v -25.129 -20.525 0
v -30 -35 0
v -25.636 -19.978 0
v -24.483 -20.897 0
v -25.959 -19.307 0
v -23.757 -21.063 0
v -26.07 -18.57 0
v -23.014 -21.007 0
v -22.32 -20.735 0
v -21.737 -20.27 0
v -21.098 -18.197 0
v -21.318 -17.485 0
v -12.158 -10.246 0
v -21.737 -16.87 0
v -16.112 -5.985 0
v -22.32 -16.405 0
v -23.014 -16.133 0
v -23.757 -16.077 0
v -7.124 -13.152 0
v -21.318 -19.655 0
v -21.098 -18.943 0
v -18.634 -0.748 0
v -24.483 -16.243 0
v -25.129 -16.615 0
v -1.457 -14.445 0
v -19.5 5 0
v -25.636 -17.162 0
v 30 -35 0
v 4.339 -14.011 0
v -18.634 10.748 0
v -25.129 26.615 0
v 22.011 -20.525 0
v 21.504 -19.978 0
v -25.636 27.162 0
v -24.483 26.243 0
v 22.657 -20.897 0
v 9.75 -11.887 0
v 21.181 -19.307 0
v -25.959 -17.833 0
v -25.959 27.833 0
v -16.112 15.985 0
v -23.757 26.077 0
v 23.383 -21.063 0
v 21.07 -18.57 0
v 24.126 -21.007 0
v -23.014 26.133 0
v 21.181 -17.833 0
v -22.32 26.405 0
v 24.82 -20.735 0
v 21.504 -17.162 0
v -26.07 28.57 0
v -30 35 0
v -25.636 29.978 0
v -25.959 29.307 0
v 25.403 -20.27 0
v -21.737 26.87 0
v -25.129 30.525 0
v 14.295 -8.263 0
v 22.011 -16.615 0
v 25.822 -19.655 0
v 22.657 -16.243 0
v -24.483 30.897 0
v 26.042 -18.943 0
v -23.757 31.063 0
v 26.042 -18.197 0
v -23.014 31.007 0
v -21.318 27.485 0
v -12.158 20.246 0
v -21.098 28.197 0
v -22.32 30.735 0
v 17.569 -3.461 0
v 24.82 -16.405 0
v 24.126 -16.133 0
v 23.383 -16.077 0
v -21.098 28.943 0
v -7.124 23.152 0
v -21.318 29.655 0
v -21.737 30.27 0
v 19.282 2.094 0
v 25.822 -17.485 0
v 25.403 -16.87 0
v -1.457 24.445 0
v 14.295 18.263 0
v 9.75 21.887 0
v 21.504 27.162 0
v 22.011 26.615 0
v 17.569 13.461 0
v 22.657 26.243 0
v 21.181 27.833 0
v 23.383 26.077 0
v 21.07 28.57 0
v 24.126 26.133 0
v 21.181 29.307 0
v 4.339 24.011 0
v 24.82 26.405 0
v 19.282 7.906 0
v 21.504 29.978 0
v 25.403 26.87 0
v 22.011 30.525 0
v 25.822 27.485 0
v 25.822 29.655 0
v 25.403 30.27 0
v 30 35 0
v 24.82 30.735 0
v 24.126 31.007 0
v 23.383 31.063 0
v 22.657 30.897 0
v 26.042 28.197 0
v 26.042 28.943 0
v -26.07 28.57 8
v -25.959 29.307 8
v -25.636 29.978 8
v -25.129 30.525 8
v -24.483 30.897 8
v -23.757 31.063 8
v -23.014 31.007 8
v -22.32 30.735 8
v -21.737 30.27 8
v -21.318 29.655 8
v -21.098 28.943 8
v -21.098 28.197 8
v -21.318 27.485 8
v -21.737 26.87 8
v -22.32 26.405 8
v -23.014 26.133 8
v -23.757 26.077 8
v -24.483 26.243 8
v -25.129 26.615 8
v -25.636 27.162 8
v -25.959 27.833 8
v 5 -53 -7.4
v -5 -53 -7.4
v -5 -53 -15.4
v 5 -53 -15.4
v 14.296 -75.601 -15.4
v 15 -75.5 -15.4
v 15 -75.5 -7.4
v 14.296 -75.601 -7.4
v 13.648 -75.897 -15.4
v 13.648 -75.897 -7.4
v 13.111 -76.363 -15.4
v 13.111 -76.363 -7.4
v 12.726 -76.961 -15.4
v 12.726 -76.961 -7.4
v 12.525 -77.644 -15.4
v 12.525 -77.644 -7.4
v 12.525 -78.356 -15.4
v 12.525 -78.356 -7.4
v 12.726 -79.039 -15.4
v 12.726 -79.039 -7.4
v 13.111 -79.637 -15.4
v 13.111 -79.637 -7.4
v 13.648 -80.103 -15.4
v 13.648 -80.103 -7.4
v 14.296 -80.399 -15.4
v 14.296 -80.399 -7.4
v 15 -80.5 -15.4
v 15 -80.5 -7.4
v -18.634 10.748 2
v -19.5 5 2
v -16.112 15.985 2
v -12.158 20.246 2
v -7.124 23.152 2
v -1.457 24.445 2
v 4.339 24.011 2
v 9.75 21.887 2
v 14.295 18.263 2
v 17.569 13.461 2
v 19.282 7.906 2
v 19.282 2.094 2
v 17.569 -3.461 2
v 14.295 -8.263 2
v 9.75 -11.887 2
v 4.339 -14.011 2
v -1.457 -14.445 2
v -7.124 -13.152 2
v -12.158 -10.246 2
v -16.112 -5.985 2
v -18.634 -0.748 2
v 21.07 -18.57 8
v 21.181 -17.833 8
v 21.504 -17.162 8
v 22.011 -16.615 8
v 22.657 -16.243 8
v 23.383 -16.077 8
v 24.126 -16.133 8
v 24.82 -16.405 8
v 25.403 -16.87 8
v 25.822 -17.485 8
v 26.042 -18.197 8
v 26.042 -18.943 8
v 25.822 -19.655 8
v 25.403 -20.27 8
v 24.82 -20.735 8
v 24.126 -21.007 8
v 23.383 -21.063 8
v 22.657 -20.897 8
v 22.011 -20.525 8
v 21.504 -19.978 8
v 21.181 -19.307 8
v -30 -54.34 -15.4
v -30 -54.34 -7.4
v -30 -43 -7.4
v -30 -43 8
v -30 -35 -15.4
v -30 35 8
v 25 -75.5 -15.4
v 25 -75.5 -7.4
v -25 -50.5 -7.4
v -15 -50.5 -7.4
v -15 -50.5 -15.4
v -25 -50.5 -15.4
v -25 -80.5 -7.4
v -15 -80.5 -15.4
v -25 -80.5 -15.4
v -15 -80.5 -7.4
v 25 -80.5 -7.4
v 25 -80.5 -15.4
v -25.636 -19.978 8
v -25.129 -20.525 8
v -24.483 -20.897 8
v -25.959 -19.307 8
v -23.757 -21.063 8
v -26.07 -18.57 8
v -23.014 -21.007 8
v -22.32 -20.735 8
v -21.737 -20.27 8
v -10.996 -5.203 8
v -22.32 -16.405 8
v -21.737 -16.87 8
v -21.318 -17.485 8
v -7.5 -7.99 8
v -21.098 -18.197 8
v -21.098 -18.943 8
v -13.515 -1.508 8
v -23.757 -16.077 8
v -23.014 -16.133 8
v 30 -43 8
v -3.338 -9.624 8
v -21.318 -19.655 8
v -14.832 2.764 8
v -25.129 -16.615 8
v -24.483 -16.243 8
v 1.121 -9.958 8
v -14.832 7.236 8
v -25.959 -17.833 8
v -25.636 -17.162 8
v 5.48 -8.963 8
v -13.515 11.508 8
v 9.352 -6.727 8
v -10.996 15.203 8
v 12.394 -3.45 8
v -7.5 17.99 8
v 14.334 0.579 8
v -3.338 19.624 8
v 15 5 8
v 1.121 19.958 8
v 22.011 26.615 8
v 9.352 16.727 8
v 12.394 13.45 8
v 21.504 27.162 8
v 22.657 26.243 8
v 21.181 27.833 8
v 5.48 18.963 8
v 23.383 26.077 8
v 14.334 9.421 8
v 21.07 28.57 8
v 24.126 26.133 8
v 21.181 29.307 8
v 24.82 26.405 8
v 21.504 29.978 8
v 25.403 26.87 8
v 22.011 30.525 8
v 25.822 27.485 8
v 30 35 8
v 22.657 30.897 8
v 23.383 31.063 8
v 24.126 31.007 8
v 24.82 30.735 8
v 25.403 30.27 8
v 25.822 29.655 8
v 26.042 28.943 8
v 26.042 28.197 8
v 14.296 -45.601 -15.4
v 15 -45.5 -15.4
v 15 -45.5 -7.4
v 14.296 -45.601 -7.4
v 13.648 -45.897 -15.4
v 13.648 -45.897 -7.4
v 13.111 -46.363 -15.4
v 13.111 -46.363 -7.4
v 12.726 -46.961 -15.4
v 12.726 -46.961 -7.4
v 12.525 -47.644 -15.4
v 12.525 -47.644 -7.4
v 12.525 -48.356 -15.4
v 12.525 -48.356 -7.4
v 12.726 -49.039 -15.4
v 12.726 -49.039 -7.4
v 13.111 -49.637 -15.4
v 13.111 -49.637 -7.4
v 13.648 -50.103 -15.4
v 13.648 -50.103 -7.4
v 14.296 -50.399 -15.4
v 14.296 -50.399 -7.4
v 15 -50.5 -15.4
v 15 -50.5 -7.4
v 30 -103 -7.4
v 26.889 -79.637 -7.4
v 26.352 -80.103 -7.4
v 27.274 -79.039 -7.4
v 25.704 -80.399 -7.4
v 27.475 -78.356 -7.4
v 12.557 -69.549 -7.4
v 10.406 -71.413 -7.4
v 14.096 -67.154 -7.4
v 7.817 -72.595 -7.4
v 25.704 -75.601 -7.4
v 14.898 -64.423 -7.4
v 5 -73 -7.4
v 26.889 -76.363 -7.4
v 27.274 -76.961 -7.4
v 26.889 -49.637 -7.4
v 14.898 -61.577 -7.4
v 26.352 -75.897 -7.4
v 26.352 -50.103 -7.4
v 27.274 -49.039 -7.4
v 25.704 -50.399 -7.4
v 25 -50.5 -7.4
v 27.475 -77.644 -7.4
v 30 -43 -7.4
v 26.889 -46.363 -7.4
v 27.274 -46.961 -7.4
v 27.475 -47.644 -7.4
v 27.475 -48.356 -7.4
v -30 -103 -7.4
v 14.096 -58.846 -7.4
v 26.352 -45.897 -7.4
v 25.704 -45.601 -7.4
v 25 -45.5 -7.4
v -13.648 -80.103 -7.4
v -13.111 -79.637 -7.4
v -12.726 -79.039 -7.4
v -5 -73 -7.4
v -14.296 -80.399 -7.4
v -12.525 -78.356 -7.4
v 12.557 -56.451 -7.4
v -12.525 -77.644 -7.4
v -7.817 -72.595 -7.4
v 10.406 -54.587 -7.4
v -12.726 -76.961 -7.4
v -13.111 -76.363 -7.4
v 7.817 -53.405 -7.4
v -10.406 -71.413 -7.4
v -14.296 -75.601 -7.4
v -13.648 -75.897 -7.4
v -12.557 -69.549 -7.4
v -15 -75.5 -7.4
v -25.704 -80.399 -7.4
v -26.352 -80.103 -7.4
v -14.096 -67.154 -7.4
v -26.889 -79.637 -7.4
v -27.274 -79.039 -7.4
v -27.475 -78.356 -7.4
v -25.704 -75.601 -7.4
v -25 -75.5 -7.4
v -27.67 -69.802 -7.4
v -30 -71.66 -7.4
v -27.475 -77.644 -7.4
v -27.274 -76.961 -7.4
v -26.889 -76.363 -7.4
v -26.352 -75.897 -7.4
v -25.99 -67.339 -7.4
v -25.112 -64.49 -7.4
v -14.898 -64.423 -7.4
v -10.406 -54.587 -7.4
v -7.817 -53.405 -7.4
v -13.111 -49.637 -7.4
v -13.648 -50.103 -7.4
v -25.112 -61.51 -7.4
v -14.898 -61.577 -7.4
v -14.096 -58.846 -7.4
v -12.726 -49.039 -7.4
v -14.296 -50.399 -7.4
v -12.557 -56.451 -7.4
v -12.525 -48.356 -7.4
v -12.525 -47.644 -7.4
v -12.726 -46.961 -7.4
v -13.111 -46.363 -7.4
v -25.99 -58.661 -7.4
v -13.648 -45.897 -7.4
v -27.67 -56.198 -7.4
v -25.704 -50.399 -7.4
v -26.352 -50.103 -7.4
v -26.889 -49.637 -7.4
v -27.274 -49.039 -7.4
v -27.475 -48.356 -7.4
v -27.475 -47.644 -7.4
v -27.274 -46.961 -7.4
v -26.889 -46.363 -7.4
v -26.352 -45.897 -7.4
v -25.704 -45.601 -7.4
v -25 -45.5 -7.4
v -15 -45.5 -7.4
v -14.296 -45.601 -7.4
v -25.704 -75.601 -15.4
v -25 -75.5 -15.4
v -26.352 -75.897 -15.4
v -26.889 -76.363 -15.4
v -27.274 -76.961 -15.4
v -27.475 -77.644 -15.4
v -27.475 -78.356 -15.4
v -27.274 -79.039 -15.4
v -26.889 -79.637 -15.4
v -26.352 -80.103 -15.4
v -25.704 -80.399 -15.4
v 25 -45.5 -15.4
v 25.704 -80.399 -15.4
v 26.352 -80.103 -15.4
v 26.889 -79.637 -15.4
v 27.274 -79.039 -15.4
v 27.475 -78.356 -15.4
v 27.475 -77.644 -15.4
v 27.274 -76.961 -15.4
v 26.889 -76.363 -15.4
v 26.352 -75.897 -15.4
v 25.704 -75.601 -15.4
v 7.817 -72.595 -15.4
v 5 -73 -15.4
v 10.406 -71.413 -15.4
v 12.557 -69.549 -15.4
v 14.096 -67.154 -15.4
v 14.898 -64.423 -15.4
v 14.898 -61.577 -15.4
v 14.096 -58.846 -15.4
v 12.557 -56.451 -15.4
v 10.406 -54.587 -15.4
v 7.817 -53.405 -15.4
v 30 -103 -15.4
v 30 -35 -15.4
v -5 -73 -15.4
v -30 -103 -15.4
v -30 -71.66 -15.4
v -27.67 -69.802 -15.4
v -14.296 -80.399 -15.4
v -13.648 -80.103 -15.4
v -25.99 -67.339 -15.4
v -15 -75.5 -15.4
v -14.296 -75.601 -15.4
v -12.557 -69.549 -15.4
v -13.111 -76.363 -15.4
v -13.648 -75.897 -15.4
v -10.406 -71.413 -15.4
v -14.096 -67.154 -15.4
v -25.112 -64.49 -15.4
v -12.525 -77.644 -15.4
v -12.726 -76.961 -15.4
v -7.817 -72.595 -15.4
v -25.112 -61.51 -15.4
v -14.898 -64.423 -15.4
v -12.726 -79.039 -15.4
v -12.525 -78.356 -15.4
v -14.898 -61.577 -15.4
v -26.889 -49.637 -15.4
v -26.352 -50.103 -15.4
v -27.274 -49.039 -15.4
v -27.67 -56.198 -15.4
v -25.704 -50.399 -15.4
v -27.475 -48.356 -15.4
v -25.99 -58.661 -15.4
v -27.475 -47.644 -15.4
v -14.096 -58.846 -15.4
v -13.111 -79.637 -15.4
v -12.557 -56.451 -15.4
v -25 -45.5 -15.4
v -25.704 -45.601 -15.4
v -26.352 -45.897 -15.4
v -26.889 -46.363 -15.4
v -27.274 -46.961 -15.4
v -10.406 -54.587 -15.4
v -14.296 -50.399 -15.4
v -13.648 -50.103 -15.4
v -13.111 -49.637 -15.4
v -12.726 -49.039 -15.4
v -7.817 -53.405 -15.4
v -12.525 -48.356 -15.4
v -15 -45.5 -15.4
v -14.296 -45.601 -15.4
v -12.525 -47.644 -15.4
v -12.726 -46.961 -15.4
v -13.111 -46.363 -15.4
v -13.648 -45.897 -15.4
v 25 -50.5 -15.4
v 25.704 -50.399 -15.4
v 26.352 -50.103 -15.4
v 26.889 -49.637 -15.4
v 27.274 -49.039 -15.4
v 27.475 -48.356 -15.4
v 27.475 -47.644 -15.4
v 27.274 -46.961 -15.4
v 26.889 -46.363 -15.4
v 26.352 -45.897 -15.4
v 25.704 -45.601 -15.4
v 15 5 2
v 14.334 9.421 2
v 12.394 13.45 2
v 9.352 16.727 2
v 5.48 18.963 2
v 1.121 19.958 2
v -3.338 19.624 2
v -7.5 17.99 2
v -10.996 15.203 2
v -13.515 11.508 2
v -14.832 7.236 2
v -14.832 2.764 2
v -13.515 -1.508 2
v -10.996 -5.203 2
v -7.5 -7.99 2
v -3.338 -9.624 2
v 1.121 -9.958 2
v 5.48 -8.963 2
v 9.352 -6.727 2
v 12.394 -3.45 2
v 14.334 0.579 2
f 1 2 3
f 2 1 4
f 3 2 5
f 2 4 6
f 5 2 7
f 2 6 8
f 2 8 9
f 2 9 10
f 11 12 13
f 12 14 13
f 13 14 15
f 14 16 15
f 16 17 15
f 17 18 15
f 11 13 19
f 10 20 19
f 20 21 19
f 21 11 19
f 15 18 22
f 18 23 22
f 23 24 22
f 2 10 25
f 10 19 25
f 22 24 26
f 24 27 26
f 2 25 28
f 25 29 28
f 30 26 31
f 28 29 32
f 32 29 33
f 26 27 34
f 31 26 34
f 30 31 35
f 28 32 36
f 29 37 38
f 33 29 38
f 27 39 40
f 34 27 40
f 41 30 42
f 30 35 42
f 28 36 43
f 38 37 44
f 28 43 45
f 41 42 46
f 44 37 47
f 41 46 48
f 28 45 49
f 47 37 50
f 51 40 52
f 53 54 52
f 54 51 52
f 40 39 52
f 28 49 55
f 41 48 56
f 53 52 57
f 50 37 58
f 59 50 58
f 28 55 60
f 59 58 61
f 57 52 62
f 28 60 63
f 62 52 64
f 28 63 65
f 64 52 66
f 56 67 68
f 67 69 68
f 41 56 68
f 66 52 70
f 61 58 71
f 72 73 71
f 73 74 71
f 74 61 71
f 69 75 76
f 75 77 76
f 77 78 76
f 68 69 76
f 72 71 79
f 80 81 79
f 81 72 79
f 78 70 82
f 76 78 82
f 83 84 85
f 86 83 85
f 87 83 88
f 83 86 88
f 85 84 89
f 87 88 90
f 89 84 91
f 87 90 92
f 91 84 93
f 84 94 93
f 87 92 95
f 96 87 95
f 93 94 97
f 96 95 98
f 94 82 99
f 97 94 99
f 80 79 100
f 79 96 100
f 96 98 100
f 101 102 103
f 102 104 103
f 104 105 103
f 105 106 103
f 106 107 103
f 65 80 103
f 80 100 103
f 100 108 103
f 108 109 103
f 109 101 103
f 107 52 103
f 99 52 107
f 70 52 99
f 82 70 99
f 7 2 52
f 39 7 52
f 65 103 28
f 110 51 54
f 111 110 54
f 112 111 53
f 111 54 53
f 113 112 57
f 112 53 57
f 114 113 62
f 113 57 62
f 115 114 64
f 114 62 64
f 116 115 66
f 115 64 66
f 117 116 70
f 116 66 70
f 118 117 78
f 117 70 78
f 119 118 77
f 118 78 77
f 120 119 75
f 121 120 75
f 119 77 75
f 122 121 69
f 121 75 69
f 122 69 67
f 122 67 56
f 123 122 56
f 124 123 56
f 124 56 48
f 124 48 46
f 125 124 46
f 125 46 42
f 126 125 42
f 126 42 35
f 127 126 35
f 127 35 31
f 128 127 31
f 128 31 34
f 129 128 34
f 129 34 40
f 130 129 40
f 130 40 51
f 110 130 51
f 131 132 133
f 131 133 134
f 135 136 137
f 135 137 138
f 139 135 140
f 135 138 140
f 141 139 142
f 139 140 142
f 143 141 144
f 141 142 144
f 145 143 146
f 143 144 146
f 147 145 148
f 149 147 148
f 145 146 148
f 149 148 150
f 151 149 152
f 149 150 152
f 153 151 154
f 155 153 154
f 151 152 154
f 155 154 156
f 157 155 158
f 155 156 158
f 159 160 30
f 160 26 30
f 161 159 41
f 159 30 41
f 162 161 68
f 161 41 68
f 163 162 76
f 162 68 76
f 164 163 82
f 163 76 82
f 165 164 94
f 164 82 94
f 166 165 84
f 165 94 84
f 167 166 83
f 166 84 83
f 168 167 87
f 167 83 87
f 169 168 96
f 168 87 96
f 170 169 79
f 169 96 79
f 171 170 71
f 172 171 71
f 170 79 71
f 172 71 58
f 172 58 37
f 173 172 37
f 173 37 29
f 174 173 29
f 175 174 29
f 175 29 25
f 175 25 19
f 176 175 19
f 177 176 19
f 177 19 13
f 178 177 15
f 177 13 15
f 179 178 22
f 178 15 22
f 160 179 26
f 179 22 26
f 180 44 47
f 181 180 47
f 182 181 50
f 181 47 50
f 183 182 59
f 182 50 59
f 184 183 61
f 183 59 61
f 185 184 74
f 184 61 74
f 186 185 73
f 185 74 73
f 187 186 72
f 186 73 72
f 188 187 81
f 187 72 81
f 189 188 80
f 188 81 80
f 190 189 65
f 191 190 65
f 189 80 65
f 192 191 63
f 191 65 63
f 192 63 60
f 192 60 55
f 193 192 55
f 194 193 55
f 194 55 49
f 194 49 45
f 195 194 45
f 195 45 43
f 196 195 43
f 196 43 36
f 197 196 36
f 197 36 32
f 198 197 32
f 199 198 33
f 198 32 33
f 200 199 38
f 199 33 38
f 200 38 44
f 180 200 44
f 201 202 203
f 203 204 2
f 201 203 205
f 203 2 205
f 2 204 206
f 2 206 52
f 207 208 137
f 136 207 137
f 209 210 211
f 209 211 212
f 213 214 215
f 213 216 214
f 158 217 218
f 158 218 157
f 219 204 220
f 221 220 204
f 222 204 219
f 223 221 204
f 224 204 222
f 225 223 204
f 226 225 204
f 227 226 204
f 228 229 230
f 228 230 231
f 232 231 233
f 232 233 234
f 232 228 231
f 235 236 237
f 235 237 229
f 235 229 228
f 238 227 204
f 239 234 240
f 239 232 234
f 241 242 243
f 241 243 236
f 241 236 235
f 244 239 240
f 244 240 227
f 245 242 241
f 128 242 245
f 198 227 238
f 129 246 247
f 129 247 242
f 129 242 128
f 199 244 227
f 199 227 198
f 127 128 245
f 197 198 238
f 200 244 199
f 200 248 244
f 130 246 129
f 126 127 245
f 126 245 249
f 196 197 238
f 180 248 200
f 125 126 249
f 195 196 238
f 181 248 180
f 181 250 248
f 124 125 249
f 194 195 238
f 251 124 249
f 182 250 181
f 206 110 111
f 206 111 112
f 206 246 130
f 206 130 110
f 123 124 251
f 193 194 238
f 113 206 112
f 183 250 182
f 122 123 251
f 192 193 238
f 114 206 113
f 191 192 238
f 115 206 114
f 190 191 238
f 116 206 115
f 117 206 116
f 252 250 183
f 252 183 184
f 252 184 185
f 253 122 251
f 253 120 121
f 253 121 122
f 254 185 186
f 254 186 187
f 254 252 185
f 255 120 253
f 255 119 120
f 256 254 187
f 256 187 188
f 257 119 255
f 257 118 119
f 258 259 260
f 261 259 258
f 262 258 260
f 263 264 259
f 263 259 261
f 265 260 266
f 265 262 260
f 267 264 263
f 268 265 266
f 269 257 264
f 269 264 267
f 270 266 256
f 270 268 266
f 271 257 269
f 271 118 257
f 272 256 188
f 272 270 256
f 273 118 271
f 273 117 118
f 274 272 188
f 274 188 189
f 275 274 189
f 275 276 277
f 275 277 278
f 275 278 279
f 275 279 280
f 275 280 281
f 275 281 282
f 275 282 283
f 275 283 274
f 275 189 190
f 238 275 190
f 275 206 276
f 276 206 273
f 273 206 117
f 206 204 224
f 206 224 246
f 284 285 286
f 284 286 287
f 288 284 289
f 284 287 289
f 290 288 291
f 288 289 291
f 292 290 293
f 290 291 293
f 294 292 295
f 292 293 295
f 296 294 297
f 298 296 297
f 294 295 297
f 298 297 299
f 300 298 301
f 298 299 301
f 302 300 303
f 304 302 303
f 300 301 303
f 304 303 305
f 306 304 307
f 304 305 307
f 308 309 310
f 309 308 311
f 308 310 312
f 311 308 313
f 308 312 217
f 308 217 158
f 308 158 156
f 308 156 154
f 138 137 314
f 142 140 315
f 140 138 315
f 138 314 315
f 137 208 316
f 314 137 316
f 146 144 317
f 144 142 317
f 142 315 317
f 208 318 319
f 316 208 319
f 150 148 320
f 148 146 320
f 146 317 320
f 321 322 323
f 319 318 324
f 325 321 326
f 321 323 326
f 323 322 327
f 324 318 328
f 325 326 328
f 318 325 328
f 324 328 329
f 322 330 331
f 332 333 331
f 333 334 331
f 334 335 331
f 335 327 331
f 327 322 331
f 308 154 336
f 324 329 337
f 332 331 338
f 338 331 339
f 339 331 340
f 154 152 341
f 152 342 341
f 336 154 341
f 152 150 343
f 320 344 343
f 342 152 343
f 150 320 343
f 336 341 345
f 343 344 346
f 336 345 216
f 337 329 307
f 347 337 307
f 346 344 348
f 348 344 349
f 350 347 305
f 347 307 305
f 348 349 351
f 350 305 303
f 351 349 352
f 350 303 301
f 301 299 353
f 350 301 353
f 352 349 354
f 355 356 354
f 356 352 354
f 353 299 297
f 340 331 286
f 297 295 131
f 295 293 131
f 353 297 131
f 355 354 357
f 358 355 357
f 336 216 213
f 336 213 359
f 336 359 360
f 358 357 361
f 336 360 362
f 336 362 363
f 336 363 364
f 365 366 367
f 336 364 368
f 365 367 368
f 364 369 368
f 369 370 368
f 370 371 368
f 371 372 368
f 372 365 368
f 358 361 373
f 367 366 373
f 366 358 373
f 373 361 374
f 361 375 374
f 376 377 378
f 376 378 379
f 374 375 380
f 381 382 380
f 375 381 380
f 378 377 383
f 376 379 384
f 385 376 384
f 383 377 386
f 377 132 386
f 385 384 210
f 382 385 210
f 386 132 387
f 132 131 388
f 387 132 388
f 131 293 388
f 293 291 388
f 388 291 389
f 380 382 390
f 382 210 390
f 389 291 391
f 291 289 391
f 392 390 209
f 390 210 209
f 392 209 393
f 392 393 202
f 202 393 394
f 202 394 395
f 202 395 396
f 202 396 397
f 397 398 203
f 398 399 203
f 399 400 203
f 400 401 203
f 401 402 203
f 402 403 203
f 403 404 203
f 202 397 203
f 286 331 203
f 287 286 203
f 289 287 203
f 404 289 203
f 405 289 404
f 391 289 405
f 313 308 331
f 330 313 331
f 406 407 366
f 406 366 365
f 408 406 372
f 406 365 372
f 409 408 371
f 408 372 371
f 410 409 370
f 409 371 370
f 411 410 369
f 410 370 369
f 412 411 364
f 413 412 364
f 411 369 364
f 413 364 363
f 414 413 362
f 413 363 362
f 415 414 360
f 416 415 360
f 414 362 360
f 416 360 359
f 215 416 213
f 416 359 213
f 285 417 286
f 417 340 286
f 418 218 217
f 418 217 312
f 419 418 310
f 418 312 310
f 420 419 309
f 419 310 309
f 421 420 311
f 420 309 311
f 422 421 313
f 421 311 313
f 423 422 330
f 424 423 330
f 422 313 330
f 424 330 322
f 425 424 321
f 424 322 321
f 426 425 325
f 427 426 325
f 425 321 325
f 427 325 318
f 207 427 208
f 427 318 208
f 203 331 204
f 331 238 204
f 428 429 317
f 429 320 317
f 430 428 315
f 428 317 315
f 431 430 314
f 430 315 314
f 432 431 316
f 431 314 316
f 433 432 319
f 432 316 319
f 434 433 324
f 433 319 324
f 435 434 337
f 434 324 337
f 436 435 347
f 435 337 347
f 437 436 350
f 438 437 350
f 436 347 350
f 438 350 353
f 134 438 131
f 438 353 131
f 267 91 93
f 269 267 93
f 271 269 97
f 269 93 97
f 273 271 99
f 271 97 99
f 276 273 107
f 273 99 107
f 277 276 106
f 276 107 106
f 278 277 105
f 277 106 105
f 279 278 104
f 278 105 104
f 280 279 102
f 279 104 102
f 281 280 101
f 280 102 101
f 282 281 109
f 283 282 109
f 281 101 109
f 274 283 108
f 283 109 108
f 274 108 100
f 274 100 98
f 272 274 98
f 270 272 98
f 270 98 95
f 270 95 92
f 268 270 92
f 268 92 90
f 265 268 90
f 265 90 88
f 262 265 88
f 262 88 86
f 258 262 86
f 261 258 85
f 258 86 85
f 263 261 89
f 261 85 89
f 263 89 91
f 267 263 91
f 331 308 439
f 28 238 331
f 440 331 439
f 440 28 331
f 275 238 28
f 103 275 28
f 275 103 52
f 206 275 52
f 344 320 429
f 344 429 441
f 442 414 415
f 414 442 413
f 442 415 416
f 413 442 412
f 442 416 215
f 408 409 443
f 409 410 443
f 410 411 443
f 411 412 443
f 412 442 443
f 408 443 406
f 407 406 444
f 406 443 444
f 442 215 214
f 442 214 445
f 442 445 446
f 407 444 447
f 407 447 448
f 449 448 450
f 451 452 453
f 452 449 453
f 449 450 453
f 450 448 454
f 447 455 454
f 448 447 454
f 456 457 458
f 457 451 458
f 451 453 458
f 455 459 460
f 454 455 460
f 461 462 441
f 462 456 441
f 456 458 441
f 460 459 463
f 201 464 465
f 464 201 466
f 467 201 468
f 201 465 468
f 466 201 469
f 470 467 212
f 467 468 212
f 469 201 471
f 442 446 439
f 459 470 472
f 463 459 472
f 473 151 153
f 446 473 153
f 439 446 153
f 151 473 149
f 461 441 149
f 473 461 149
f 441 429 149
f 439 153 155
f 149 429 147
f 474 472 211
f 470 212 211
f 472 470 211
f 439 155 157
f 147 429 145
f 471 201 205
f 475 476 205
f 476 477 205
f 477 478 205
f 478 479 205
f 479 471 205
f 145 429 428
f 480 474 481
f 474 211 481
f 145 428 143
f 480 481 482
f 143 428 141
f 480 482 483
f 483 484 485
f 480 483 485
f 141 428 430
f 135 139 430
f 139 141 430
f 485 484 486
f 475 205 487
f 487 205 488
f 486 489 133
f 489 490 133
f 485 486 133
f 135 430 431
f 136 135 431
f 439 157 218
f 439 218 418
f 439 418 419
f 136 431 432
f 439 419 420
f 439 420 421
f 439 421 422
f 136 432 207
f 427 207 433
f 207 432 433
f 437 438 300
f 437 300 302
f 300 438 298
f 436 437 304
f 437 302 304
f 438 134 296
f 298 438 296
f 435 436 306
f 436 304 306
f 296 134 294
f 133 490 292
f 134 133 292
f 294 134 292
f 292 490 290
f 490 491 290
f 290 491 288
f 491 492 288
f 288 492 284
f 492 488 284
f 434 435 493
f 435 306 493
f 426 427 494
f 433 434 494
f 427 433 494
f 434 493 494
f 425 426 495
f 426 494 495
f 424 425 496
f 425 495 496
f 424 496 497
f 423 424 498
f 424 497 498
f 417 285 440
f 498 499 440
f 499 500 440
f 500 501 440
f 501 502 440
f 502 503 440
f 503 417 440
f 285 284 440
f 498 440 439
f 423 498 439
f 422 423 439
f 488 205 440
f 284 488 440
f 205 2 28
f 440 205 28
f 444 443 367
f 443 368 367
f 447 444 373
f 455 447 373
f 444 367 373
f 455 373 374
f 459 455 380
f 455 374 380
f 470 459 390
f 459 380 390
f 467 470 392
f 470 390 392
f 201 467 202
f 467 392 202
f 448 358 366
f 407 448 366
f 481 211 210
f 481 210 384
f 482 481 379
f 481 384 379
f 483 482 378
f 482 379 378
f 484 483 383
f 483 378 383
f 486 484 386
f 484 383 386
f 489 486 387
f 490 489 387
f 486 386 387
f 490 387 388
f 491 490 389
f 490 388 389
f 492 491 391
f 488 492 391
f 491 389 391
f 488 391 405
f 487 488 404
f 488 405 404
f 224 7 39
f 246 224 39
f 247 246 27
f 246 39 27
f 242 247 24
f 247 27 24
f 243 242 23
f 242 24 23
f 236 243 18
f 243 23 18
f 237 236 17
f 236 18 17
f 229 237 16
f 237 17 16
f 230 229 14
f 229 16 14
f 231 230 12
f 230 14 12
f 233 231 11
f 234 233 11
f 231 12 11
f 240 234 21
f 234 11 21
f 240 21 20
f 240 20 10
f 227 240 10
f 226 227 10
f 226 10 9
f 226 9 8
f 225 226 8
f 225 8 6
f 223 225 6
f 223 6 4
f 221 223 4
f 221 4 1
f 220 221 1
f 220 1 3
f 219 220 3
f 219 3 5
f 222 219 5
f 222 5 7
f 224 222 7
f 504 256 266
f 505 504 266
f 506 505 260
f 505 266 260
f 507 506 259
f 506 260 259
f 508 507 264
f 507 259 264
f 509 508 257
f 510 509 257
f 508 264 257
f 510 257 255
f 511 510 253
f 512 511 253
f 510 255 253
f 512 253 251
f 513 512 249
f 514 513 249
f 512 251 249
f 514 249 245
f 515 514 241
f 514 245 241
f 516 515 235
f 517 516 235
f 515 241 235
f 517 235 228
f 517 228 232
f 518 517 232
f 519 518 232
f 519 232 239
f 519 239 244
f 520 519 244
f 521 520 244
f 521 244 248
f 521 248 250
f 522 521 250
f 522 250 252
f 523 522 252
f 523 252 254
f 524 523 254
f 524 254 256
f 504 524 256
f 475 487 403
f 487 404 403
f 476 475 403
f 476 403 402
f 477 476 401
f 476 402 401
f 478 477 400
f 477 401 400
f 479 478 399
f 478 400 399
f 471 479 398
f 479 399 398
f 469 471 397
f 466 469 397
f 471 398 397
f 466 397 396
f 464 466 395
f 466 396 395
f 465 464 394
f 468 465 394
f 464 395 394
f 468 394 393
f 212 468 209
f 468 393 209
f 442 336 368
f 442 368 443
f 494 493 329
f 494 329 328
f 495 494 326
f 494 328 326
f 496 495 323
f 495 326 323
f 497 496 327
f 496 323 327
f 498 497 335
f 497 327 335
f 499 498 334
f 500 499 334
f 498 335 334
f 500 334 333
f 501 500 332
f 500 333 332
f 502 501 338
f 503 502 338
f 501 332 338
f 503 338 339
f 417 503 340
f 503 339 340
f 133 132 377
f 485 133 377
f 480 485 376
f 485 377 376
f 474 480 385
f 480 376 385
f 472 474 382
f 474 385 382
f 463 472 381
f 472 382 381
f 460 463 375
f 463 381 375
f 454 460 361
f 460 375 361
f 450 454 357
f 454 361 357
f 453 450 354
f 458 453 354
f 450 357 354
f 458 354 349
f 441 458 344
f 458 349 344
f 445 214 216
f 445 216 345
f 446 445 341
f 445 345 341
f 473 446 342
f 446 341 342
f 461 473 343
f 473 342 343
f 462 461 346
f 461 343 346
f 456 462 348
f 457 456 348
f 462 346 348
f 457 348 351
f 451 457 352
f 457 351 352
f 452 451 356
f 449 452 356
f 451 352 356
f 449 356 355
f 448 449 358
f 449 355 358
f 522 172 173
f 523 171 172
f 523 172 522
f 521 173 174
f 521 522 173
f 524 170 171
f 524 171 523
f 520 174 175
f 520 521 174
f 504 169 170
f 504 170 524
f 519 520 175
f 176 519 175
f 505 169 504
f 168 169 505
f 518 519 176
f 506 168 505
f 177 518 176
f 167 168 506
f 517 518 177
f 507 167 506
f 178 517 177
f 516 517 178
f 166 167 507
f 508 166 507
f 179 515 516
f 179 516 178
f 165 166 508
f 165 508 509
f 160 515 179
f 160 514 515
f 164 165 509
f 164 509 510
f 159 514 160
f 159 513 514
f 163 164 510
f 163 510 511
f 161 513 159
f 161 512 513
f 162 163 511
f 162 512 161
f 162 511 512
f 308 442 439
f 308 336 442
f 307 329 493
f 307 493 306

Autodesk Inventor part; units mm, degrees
ref_plane "YZ Plane" through (0, 0, 0) normal (1, 0, 0) x (0, 1, 0)
ref_plane "XZ Plane" through (0, 0, 0) normal (0, 1, 0) x (-1, 0, 0)
ref_plane "XY Plane" through (0, 0, 0) normal (0, 0, 1) x (1, 0, 0)
sketch "Szkic1" plane through (0, 0, 0) normal (0, 0, 1) x (1, 0, 0)
  line L0 (-30, -35) -> (30, -35)
  line L1 (30, -35) -> (30, 35)
  line L2 (30, 35) -> (-30, 35)
  line L3 (-30, 35) -> (-30, -35)
  line L4 (-30, -35) -> (30, 35) construction
  line L5 (30, -35) -> (-30, 35) construction
  point P0 (0, 0)
  dimension "d0" = 60
  dimension "d1" = 70
extrude "Wyciągnięcie proste1" add sketch "Szkic1" along normal blind 8
sketch "Szkic2" plane through (0, 0, 0) normal (0, 0, -1) x (-1, 0, 0)
  line L0 (30, -35) -> (-30, -35) projected
  line L1 (30, 35) -> (30, -35) projected
  line L2 (-30, 35) -> (30, 35) projected
  line L3 (-30, -35) -> (-30, 35) projected
  line L4 (23.57, 5) -> (23.57, 28.57)
  line L5 (23.57, 28.57) -> (-23.57, 28.57)
  line L6 (-23.57, 28.57) -> (-23.57, -18.57)
  line L7 (-23.57, -18.57) -> (23.57, -18.57)
  line L8 (23.57, -18.57) -> (23.57, 5)
  circle A0 centre (23.57, 28.57) radius 2.5
  circle A1 centre (-23.57, 28.57) radius 2.5
  circle A2 centre (-23.57, -18.57) radius 2.5
  circle A3 centre (23.57, -18.57) radius 2.5
  line L9 (0, 0) -> (0, 5)
  dimension "d6" = 47.14
  dimension "d7" = 47.14
  dimension "d8" = 47.14
  dimension "d9" = 5
  dimension "d10" = 5
  dimension "d11" = 5
  dimension "d12" = 5
  dimension "d15" = 5
extrude "Wyciągnięcie proste3" cut sketch "Szkic2" against normal up to next contours A0 L5 L4 | L4 L5 A0 | A3 L7 L8 | L8 L7 A3 | A1 L6 L5 | L5 L6 A1 | A2 L6 L7 | L7 L6 A2
sketch "Szkic4" plane through (0, 0, 8) normal (0, 0, 1) x (1, 0, 0)
  line L0 (-30, -35) -> (30, -35) projected
  line L1 (30, -35) -> (30, -43)
  line L2 (30, -43) -> (-30, -43)
  line L3 (-30, -43) -> (-30, -35)
  point P0 (0, 0)
  dimension "d18" = 8
extrude "Wyciągnięcie proste4" add sketch "Szkic4" against normal blind 43.4
sketch "Szkic5" plane through (0, 0, 8) normal (0, 0, 1) x (1, 0, 0)
  circle A0 centre (-23.57, -18.57) radius 2.5 projected
  circle A1 centre (23.57, 28.57) radius 2.5 projected
  circle A2 centre (-23.57, 28.57) radius 2.5 projected
  circle A3 centre (23.57, -18.57) radius 2.5 projected
  line L0 (30, 35) -> (30, -43) projected
  line L1 (30, 35) -> (-30, 35) projected
  line L2 (-30, 35) -> (-30, -43) projected
  line L3 (30, -43) -> (-30, -43) projected
  line L4 (23.57, -18.57) -> (-23.57, 28.57)
  line L5 (-23.57, -18.57) -> (23.57, 28.57)
  circle A4 centre (0, 5) radius 15
  point P0 (0, 0)
  dimension "d21" = 30
extrude "Wyciągnięcie proste5" cut sketch "Szkic5" against normal up to next contours A4 L4 L5 | L5 L4 A4 | L5 A4 L4 | L4 A4 L5
thread "Gwint1" size "M5x0.8" class "6H" standard "ANSI Metric M Profile" full length
thread "Gwint2" size "M5x0.8" class "6H" standard "ANSI Metric M Profile" full length
thread "Gwint3" size "M5x0.8" class "6H" standard "ANSI Metric M Profile" full length
thread "Gwint4" size "M5x0.8" class "6H" standard "ANSI Metric M Profile" full length
sketch "Szkic10" plane through (0, 0, 0) normal (0, 0, -1) x (-1, 0, 0)
  circle A0 centre (0, 5) radius 15 projected
  circle A1 centre (0, 5) radius 19.5
  point P0 (0, 0)
  dimension "d59" = 39
extrude "Wyciągnięcie proste10" cut sketch "Szkic10" against normal blind 2
sketch "Szkic12" plane through (0, 0, -35.4) normal (0, 0, -1) x (-1, 0, 0)
  line L0 (30, -35) -> (-30, -35) projected
  line L1 (-30, -35) -> (-30, -43) projected
  line L2 (-30, -43) -> (30, -43) projected
  line L3 (30, -43) -> (30, -35) projected
  point P0 (0, 0)
extrude "Wyciągnięcie proste12" cut sketch "Szkic12" against normal blind 20
sketch "Szkic13" plane through (-30, -43, 8) normal (0, -1, 0) x (1, 0, 0)
  line L0 (0, -23.4) -> (60, -23.4) projected
  line L1 (0, 0) -> (0, -23.4) projected
  line L2 (60, 0) -> (60, -23.4) projected
  line L3 (60, -23.4) -> (60, -15.4)
  line L4 (60, -8) -> (60, -23.4) projected
  line L5 (60, -15.4) -> (0, -15.4)
  point P0 (30, -8)
  dimension "d66" = 8
extrude "Wyciągnięcie proste13" add sketch "Szkic13" along normal blind 60
sketch "Szkic16" plane through (-30, -43, -7.4) normal (0, 0, 1) x (1, 0, 0)
  line L0 (60, -60) -> (0, -60)
  line L1 (60, 0) -> (60, -60)
  line L2 (0, 0) -> (60, 0)
  line L3 (0, 0) -> (0, -60)
  circle A0 centre (30, -20) radius 6.5
  line L4 (30, -20) -> (35, -20)
  line L5 (30, -20) -> (25, -20)
  arc A1 (35, -30) -> (35, -10) centre (35, -20) ccw
  arc A2 (25, -10) -> (25, -30) centre (25, -20) ccw
  line L6 (25, -10) -> (35, -10)
  line L7 (35, -30) -> (25, -30)
  point P0 (30, 43)
  dimension "d87" = 5
  dimension "d88" = 5
  dimension "d89" = 10
extrude "Wyciągnięcie proste15" cut sketch "Szkic16" against normal up to next contours A0 | L7 A2 L6 A1
sketch "Szkic17" plane through (-30, -43, -7.4) normal (0, 0, 1) x (1, 0, 0)
  line L0 (25, -10) -> (35, -10) projected
  arc A0 (35, -30) -> (35, -10) centre (35, -20) ccw projected
  line L1 (35, -30) -> (25, -30) projected
  arc A1 (25, -10) -> (25, -30) centre (25, -20) ccw projected
  line L2 (0, 0) -> (60, 0) projected
  line L3 (0, 0) -> (0, -60) projected
  line L4 (60, -60) -> (0, -60) projected
  line L5 (60, 0) -> (60, -60) projected
  line L6 (60, 0) -> (60, -5)
  line L7 (60, 8) -> (60, -60) projected
  line L8 (30, -30) -> (30, -35)
  line L9 (60, -5) -> (57.5, -5)
  arc A2 (55, -7.5) -> (55, -2.5) centre (55, -5) ccw
  arc A3 (45, -2.5) -> (45, -7.5) centre (45, -5) ccw
  line L10 (55, -7.5) -> (45, -7.5)
  line L11 (60, -5) -> (57.5, -5)
  line L12 (55, -2.5) -> (45, -2.5)
  line L13 (60, -35) -> (57.5, -35)
  arc A4 (55, -37.5) -> (55, -32.5) centre (55, -35) ccw
  arc A5 (45, -32.5) -> (45, -37.5) centre (45, -35) ccw
  line L14 (55, -37.5) -> (45, -37.5)
  line L15 (55, -32.5) -> (45, -32.5)
  line L16 (30, -35) -> (42.5, -35)
  line L17 (57.5, -35) -> (60, -35)
  line L18 (0, -5) -> (2.5, -5)
  line L19 (0, -35) -> (2.5, -35)
  arc A6 (15, -7.5) -> (15, -2.5) centre (15, -5) ccw
  line L20 (15, -7.5) -> (5, -7.5)
  line L21 (15, -2.5) -> (5, -2.5)
  arc A7 (5, -2.5) -> (5, -7.5) centre (5, -5) ccw
  arc A8 (15, -37.5) -> (15, -32.5) centre (15, -35) ccw
  line L22 (15, -37.5) -> (5, -37.5)
  line L23 (15, -32.5) -> (5, -32.5)
  arc A9 (5, -32.5) -> (5, -37.5) centre (5, -35) ccw
  line L24 (42.5, -5) -> (17.5, -5)
  line L25 (2.5, -5) -> (0, -5)
  line L26 (30, -35) -> (17.5, -35)
  line L27 (2.5, -35) -> (0, -35)
  point P0 (30, 43)
  dimension "d92" = 5
  dimension "d93" = 5
  dimension "d98" = 2.5
  dimension "d99" = 2.5
  dimension "d100" = 2.5
  dimension "d101" = 2.5
extrude "Wyciągnięcie proste16" cut sketch "Szkic17" against normal up to next contours A5 L15 A4 L14 | A8 L22 A9 L23 | A2 L10 A3 L12 | A7 L21 A6 L20
sketch "Szkic18" plane through (-30, -43, -7.4) normal (0, 0, 1) x (1, 0, 0)
  line L0 (55, -5) -> (50, -5)
  line L1 (55, -35) -> (50, -35)
  line L2 (5, -5) -> (10, -5)
  line L3 (5, -35) -> (10, -35)
  circle A0 centre (10, -5) radius 2
  circle A1 centre (10, -35) radius 2
  circle A2 centre (50, -35) radius 2
  circle A3 centre (50, -5) radius 2
  line L4 (45, -2.5) -> (55, -2.5) projected
  arc A4 (55, -7.5) -> (55, -2.5) centre (55, -5) ccw projected
  line L5 (55, -7.5) -> (45, -7.5) projected
  arc A5 (45, -2.5) -> (45, -7.5) centre (45, -5) ccw projected
  line L6 (15, -37.5) -> (5, -37.5) projected
  arc A6 (5, -32.5) -> (5, -37.5) centre (5, -35) ccw projected
  line L7 (5, -32.5) -> (15, -32.5) projected
  arc A7 (15, -37.5) -> (15, -32.5) centre (15, -35) ccw projected
  line L8 (5, -2.5) -> (15, -2.5) projected
  arc A8 (15, -7.5) -> (15, -2.5) centre (15, -5) ccw projected
  line L9 (15, -7.5) -> (5, -7.5) projected
  arc A9 (5, -2.5) -> (5, -7.5) centre (5, -5) ccw projected
  line L10 (55, -37.5) -> (45, -37.5) projected
  arc A10 (45, -32.5) -> (45, -37.5) centre (45, -35) ccw projected
  line L11 (45, -32.5) -> (55, -32.5) projected
  arc A11 (55, -37.5) -> (55, -32.5) centre (55, -35) ccw projected
  line L12 (25, -10) -> (35, -10) projected
  arc A12 (35, -30) -> (35, -10) centre (35, -20) ccw projected
  line L13 (35, -30) -> (25, -30) projected
  arc A13 (25, -10) -> (25, -30) centre (25, -20) ccw projected
  line L14 (0, 0) -> (60, 0) projected
  line L15 (0, 0) -> (0, -60) projected
  line L16 (60, -60) -> (0, -60) projected
  line L17 (60, 0) -> (60, -60) projected
  line L18 (55, -5) -> (60, -5)
  line L19 (55, -35) -> (60, -35)
  line L20 (5, -5) -> (0, -5)
  line L21 (5, -35) -> (0, -35)
  point P0 (30, 43)
  dimension "d104" = 5
  dimension "d105" = 5
  dimension "d106" = 5
  dimension "d107" = 5
  dimension "d108" = 4
  dimension "d109" = 4
  dimension "d110" = 4
  dimension "d111" = 4
sketch "Szkic19" plane through (-30, -43, -7.4) normal (0, 0, 1) x (1, 0, 0)
  line L0 (45, -2.5) -> (55, -2.5)
  arc A0 (55, -7.5) -> (55, -2.5) centre (55, -5) ccw
  line L1 (55, -7.5) -> (45, -7.5)
  arc A1 (45, -2.5) -> (45, -7.5) centre (45, -5) ccw
  line L2 (15, -37.5) -> (5, -37.5)
  arc A2 (5, -32.5) -> (5, -37.5) centre (5, -35) ccw
  line L3 (5, -32.5) -> (15, -32.5)
  arc A3 (15, -37.5) -> (15, -32.5) centre (15, -35) ccw
  line L4 (5, -2.5) -> (15, -2.5)
  arc A4 (15, -7.5) -> (15, -2.5) centre (15, -5) ccw
  line L5 (15, -7.5) -> (5, -7.5)
  arc A5 (5, -2.5) -> (5, -7.5) centre (5, -5) ccw
  line L6 (55, -37.5) -> (45, -37.5)
  arc A6 (45, -32.5) -> (45, -37.5) centre (45, -35) ccw
  line L7 (45, -32.5) -> (55, -32.5)
  arc A7 (55, -37.5) -> (55, -32.5) centre (55, -35) ccw
  line L8 (25, -10) -> (35, -10)
  arc A8 (35, -30) -> (35, -10) centre (35, -20) ccw
  line L9 (35, -30) -> (25, -30)
  arc A9 (25, -10) -> (25, -30) centre (25, -20) ccw
  line L10 (0, 0) -> (60, 0)
  line L11 (60, -60) -> (0, -60)
  line L12 (60, 0) -> (60, -60)
  line L13 (60, 0) -> (60, -60)
  line L14 (60, -60) -> (0, -60)
  line L15 (0, 0) -> (60, 0)
  circle A10 centre (29.9999, -20) radius 6.5
  circle A11 centre (-10.0001, -20) radius 6.5
  line L16 (-10.0001, -20) -> (-5.0001, -20)
  arc A12 (0, -28.6602) -> (0, -11.3398) centre (-5.0001, -20) ccw
  line L17 (0, 0) -> (0, -2.5)
  line L18 (0, -37.5) -> (0, -60)
  line L19 (0, -11.3398) -> (0, -2.5)
  line L20 (0, 8) -> (0, -60) projected
  line L21 (0, -28.6602) -> (0, -37.5)
  line L22 (-5.0001, -20) -> (-3.5001, -20)
  line L23 (0, -11.3398) -> (-3.5001, -11.3398)
  line L24 (-3.5001, -11.3398) -> (-3.5001, -28.6602)
  line L25 (-3.5001, -28.6602) -> (0, -28.6602)
  point P0 (30, 43)
  dimension "d112" = 13
  dimension "d113" = 13
  dimension "d114" = 4.9999
  dimension "d115" = 5
extrude "Wyciągnięcie proste17" cut sketch "Szkic19" against normal up to next contours A12 L20 | L20 L25 L24 L23
properties part number "Uchwyt silnika krokowego osi X"
